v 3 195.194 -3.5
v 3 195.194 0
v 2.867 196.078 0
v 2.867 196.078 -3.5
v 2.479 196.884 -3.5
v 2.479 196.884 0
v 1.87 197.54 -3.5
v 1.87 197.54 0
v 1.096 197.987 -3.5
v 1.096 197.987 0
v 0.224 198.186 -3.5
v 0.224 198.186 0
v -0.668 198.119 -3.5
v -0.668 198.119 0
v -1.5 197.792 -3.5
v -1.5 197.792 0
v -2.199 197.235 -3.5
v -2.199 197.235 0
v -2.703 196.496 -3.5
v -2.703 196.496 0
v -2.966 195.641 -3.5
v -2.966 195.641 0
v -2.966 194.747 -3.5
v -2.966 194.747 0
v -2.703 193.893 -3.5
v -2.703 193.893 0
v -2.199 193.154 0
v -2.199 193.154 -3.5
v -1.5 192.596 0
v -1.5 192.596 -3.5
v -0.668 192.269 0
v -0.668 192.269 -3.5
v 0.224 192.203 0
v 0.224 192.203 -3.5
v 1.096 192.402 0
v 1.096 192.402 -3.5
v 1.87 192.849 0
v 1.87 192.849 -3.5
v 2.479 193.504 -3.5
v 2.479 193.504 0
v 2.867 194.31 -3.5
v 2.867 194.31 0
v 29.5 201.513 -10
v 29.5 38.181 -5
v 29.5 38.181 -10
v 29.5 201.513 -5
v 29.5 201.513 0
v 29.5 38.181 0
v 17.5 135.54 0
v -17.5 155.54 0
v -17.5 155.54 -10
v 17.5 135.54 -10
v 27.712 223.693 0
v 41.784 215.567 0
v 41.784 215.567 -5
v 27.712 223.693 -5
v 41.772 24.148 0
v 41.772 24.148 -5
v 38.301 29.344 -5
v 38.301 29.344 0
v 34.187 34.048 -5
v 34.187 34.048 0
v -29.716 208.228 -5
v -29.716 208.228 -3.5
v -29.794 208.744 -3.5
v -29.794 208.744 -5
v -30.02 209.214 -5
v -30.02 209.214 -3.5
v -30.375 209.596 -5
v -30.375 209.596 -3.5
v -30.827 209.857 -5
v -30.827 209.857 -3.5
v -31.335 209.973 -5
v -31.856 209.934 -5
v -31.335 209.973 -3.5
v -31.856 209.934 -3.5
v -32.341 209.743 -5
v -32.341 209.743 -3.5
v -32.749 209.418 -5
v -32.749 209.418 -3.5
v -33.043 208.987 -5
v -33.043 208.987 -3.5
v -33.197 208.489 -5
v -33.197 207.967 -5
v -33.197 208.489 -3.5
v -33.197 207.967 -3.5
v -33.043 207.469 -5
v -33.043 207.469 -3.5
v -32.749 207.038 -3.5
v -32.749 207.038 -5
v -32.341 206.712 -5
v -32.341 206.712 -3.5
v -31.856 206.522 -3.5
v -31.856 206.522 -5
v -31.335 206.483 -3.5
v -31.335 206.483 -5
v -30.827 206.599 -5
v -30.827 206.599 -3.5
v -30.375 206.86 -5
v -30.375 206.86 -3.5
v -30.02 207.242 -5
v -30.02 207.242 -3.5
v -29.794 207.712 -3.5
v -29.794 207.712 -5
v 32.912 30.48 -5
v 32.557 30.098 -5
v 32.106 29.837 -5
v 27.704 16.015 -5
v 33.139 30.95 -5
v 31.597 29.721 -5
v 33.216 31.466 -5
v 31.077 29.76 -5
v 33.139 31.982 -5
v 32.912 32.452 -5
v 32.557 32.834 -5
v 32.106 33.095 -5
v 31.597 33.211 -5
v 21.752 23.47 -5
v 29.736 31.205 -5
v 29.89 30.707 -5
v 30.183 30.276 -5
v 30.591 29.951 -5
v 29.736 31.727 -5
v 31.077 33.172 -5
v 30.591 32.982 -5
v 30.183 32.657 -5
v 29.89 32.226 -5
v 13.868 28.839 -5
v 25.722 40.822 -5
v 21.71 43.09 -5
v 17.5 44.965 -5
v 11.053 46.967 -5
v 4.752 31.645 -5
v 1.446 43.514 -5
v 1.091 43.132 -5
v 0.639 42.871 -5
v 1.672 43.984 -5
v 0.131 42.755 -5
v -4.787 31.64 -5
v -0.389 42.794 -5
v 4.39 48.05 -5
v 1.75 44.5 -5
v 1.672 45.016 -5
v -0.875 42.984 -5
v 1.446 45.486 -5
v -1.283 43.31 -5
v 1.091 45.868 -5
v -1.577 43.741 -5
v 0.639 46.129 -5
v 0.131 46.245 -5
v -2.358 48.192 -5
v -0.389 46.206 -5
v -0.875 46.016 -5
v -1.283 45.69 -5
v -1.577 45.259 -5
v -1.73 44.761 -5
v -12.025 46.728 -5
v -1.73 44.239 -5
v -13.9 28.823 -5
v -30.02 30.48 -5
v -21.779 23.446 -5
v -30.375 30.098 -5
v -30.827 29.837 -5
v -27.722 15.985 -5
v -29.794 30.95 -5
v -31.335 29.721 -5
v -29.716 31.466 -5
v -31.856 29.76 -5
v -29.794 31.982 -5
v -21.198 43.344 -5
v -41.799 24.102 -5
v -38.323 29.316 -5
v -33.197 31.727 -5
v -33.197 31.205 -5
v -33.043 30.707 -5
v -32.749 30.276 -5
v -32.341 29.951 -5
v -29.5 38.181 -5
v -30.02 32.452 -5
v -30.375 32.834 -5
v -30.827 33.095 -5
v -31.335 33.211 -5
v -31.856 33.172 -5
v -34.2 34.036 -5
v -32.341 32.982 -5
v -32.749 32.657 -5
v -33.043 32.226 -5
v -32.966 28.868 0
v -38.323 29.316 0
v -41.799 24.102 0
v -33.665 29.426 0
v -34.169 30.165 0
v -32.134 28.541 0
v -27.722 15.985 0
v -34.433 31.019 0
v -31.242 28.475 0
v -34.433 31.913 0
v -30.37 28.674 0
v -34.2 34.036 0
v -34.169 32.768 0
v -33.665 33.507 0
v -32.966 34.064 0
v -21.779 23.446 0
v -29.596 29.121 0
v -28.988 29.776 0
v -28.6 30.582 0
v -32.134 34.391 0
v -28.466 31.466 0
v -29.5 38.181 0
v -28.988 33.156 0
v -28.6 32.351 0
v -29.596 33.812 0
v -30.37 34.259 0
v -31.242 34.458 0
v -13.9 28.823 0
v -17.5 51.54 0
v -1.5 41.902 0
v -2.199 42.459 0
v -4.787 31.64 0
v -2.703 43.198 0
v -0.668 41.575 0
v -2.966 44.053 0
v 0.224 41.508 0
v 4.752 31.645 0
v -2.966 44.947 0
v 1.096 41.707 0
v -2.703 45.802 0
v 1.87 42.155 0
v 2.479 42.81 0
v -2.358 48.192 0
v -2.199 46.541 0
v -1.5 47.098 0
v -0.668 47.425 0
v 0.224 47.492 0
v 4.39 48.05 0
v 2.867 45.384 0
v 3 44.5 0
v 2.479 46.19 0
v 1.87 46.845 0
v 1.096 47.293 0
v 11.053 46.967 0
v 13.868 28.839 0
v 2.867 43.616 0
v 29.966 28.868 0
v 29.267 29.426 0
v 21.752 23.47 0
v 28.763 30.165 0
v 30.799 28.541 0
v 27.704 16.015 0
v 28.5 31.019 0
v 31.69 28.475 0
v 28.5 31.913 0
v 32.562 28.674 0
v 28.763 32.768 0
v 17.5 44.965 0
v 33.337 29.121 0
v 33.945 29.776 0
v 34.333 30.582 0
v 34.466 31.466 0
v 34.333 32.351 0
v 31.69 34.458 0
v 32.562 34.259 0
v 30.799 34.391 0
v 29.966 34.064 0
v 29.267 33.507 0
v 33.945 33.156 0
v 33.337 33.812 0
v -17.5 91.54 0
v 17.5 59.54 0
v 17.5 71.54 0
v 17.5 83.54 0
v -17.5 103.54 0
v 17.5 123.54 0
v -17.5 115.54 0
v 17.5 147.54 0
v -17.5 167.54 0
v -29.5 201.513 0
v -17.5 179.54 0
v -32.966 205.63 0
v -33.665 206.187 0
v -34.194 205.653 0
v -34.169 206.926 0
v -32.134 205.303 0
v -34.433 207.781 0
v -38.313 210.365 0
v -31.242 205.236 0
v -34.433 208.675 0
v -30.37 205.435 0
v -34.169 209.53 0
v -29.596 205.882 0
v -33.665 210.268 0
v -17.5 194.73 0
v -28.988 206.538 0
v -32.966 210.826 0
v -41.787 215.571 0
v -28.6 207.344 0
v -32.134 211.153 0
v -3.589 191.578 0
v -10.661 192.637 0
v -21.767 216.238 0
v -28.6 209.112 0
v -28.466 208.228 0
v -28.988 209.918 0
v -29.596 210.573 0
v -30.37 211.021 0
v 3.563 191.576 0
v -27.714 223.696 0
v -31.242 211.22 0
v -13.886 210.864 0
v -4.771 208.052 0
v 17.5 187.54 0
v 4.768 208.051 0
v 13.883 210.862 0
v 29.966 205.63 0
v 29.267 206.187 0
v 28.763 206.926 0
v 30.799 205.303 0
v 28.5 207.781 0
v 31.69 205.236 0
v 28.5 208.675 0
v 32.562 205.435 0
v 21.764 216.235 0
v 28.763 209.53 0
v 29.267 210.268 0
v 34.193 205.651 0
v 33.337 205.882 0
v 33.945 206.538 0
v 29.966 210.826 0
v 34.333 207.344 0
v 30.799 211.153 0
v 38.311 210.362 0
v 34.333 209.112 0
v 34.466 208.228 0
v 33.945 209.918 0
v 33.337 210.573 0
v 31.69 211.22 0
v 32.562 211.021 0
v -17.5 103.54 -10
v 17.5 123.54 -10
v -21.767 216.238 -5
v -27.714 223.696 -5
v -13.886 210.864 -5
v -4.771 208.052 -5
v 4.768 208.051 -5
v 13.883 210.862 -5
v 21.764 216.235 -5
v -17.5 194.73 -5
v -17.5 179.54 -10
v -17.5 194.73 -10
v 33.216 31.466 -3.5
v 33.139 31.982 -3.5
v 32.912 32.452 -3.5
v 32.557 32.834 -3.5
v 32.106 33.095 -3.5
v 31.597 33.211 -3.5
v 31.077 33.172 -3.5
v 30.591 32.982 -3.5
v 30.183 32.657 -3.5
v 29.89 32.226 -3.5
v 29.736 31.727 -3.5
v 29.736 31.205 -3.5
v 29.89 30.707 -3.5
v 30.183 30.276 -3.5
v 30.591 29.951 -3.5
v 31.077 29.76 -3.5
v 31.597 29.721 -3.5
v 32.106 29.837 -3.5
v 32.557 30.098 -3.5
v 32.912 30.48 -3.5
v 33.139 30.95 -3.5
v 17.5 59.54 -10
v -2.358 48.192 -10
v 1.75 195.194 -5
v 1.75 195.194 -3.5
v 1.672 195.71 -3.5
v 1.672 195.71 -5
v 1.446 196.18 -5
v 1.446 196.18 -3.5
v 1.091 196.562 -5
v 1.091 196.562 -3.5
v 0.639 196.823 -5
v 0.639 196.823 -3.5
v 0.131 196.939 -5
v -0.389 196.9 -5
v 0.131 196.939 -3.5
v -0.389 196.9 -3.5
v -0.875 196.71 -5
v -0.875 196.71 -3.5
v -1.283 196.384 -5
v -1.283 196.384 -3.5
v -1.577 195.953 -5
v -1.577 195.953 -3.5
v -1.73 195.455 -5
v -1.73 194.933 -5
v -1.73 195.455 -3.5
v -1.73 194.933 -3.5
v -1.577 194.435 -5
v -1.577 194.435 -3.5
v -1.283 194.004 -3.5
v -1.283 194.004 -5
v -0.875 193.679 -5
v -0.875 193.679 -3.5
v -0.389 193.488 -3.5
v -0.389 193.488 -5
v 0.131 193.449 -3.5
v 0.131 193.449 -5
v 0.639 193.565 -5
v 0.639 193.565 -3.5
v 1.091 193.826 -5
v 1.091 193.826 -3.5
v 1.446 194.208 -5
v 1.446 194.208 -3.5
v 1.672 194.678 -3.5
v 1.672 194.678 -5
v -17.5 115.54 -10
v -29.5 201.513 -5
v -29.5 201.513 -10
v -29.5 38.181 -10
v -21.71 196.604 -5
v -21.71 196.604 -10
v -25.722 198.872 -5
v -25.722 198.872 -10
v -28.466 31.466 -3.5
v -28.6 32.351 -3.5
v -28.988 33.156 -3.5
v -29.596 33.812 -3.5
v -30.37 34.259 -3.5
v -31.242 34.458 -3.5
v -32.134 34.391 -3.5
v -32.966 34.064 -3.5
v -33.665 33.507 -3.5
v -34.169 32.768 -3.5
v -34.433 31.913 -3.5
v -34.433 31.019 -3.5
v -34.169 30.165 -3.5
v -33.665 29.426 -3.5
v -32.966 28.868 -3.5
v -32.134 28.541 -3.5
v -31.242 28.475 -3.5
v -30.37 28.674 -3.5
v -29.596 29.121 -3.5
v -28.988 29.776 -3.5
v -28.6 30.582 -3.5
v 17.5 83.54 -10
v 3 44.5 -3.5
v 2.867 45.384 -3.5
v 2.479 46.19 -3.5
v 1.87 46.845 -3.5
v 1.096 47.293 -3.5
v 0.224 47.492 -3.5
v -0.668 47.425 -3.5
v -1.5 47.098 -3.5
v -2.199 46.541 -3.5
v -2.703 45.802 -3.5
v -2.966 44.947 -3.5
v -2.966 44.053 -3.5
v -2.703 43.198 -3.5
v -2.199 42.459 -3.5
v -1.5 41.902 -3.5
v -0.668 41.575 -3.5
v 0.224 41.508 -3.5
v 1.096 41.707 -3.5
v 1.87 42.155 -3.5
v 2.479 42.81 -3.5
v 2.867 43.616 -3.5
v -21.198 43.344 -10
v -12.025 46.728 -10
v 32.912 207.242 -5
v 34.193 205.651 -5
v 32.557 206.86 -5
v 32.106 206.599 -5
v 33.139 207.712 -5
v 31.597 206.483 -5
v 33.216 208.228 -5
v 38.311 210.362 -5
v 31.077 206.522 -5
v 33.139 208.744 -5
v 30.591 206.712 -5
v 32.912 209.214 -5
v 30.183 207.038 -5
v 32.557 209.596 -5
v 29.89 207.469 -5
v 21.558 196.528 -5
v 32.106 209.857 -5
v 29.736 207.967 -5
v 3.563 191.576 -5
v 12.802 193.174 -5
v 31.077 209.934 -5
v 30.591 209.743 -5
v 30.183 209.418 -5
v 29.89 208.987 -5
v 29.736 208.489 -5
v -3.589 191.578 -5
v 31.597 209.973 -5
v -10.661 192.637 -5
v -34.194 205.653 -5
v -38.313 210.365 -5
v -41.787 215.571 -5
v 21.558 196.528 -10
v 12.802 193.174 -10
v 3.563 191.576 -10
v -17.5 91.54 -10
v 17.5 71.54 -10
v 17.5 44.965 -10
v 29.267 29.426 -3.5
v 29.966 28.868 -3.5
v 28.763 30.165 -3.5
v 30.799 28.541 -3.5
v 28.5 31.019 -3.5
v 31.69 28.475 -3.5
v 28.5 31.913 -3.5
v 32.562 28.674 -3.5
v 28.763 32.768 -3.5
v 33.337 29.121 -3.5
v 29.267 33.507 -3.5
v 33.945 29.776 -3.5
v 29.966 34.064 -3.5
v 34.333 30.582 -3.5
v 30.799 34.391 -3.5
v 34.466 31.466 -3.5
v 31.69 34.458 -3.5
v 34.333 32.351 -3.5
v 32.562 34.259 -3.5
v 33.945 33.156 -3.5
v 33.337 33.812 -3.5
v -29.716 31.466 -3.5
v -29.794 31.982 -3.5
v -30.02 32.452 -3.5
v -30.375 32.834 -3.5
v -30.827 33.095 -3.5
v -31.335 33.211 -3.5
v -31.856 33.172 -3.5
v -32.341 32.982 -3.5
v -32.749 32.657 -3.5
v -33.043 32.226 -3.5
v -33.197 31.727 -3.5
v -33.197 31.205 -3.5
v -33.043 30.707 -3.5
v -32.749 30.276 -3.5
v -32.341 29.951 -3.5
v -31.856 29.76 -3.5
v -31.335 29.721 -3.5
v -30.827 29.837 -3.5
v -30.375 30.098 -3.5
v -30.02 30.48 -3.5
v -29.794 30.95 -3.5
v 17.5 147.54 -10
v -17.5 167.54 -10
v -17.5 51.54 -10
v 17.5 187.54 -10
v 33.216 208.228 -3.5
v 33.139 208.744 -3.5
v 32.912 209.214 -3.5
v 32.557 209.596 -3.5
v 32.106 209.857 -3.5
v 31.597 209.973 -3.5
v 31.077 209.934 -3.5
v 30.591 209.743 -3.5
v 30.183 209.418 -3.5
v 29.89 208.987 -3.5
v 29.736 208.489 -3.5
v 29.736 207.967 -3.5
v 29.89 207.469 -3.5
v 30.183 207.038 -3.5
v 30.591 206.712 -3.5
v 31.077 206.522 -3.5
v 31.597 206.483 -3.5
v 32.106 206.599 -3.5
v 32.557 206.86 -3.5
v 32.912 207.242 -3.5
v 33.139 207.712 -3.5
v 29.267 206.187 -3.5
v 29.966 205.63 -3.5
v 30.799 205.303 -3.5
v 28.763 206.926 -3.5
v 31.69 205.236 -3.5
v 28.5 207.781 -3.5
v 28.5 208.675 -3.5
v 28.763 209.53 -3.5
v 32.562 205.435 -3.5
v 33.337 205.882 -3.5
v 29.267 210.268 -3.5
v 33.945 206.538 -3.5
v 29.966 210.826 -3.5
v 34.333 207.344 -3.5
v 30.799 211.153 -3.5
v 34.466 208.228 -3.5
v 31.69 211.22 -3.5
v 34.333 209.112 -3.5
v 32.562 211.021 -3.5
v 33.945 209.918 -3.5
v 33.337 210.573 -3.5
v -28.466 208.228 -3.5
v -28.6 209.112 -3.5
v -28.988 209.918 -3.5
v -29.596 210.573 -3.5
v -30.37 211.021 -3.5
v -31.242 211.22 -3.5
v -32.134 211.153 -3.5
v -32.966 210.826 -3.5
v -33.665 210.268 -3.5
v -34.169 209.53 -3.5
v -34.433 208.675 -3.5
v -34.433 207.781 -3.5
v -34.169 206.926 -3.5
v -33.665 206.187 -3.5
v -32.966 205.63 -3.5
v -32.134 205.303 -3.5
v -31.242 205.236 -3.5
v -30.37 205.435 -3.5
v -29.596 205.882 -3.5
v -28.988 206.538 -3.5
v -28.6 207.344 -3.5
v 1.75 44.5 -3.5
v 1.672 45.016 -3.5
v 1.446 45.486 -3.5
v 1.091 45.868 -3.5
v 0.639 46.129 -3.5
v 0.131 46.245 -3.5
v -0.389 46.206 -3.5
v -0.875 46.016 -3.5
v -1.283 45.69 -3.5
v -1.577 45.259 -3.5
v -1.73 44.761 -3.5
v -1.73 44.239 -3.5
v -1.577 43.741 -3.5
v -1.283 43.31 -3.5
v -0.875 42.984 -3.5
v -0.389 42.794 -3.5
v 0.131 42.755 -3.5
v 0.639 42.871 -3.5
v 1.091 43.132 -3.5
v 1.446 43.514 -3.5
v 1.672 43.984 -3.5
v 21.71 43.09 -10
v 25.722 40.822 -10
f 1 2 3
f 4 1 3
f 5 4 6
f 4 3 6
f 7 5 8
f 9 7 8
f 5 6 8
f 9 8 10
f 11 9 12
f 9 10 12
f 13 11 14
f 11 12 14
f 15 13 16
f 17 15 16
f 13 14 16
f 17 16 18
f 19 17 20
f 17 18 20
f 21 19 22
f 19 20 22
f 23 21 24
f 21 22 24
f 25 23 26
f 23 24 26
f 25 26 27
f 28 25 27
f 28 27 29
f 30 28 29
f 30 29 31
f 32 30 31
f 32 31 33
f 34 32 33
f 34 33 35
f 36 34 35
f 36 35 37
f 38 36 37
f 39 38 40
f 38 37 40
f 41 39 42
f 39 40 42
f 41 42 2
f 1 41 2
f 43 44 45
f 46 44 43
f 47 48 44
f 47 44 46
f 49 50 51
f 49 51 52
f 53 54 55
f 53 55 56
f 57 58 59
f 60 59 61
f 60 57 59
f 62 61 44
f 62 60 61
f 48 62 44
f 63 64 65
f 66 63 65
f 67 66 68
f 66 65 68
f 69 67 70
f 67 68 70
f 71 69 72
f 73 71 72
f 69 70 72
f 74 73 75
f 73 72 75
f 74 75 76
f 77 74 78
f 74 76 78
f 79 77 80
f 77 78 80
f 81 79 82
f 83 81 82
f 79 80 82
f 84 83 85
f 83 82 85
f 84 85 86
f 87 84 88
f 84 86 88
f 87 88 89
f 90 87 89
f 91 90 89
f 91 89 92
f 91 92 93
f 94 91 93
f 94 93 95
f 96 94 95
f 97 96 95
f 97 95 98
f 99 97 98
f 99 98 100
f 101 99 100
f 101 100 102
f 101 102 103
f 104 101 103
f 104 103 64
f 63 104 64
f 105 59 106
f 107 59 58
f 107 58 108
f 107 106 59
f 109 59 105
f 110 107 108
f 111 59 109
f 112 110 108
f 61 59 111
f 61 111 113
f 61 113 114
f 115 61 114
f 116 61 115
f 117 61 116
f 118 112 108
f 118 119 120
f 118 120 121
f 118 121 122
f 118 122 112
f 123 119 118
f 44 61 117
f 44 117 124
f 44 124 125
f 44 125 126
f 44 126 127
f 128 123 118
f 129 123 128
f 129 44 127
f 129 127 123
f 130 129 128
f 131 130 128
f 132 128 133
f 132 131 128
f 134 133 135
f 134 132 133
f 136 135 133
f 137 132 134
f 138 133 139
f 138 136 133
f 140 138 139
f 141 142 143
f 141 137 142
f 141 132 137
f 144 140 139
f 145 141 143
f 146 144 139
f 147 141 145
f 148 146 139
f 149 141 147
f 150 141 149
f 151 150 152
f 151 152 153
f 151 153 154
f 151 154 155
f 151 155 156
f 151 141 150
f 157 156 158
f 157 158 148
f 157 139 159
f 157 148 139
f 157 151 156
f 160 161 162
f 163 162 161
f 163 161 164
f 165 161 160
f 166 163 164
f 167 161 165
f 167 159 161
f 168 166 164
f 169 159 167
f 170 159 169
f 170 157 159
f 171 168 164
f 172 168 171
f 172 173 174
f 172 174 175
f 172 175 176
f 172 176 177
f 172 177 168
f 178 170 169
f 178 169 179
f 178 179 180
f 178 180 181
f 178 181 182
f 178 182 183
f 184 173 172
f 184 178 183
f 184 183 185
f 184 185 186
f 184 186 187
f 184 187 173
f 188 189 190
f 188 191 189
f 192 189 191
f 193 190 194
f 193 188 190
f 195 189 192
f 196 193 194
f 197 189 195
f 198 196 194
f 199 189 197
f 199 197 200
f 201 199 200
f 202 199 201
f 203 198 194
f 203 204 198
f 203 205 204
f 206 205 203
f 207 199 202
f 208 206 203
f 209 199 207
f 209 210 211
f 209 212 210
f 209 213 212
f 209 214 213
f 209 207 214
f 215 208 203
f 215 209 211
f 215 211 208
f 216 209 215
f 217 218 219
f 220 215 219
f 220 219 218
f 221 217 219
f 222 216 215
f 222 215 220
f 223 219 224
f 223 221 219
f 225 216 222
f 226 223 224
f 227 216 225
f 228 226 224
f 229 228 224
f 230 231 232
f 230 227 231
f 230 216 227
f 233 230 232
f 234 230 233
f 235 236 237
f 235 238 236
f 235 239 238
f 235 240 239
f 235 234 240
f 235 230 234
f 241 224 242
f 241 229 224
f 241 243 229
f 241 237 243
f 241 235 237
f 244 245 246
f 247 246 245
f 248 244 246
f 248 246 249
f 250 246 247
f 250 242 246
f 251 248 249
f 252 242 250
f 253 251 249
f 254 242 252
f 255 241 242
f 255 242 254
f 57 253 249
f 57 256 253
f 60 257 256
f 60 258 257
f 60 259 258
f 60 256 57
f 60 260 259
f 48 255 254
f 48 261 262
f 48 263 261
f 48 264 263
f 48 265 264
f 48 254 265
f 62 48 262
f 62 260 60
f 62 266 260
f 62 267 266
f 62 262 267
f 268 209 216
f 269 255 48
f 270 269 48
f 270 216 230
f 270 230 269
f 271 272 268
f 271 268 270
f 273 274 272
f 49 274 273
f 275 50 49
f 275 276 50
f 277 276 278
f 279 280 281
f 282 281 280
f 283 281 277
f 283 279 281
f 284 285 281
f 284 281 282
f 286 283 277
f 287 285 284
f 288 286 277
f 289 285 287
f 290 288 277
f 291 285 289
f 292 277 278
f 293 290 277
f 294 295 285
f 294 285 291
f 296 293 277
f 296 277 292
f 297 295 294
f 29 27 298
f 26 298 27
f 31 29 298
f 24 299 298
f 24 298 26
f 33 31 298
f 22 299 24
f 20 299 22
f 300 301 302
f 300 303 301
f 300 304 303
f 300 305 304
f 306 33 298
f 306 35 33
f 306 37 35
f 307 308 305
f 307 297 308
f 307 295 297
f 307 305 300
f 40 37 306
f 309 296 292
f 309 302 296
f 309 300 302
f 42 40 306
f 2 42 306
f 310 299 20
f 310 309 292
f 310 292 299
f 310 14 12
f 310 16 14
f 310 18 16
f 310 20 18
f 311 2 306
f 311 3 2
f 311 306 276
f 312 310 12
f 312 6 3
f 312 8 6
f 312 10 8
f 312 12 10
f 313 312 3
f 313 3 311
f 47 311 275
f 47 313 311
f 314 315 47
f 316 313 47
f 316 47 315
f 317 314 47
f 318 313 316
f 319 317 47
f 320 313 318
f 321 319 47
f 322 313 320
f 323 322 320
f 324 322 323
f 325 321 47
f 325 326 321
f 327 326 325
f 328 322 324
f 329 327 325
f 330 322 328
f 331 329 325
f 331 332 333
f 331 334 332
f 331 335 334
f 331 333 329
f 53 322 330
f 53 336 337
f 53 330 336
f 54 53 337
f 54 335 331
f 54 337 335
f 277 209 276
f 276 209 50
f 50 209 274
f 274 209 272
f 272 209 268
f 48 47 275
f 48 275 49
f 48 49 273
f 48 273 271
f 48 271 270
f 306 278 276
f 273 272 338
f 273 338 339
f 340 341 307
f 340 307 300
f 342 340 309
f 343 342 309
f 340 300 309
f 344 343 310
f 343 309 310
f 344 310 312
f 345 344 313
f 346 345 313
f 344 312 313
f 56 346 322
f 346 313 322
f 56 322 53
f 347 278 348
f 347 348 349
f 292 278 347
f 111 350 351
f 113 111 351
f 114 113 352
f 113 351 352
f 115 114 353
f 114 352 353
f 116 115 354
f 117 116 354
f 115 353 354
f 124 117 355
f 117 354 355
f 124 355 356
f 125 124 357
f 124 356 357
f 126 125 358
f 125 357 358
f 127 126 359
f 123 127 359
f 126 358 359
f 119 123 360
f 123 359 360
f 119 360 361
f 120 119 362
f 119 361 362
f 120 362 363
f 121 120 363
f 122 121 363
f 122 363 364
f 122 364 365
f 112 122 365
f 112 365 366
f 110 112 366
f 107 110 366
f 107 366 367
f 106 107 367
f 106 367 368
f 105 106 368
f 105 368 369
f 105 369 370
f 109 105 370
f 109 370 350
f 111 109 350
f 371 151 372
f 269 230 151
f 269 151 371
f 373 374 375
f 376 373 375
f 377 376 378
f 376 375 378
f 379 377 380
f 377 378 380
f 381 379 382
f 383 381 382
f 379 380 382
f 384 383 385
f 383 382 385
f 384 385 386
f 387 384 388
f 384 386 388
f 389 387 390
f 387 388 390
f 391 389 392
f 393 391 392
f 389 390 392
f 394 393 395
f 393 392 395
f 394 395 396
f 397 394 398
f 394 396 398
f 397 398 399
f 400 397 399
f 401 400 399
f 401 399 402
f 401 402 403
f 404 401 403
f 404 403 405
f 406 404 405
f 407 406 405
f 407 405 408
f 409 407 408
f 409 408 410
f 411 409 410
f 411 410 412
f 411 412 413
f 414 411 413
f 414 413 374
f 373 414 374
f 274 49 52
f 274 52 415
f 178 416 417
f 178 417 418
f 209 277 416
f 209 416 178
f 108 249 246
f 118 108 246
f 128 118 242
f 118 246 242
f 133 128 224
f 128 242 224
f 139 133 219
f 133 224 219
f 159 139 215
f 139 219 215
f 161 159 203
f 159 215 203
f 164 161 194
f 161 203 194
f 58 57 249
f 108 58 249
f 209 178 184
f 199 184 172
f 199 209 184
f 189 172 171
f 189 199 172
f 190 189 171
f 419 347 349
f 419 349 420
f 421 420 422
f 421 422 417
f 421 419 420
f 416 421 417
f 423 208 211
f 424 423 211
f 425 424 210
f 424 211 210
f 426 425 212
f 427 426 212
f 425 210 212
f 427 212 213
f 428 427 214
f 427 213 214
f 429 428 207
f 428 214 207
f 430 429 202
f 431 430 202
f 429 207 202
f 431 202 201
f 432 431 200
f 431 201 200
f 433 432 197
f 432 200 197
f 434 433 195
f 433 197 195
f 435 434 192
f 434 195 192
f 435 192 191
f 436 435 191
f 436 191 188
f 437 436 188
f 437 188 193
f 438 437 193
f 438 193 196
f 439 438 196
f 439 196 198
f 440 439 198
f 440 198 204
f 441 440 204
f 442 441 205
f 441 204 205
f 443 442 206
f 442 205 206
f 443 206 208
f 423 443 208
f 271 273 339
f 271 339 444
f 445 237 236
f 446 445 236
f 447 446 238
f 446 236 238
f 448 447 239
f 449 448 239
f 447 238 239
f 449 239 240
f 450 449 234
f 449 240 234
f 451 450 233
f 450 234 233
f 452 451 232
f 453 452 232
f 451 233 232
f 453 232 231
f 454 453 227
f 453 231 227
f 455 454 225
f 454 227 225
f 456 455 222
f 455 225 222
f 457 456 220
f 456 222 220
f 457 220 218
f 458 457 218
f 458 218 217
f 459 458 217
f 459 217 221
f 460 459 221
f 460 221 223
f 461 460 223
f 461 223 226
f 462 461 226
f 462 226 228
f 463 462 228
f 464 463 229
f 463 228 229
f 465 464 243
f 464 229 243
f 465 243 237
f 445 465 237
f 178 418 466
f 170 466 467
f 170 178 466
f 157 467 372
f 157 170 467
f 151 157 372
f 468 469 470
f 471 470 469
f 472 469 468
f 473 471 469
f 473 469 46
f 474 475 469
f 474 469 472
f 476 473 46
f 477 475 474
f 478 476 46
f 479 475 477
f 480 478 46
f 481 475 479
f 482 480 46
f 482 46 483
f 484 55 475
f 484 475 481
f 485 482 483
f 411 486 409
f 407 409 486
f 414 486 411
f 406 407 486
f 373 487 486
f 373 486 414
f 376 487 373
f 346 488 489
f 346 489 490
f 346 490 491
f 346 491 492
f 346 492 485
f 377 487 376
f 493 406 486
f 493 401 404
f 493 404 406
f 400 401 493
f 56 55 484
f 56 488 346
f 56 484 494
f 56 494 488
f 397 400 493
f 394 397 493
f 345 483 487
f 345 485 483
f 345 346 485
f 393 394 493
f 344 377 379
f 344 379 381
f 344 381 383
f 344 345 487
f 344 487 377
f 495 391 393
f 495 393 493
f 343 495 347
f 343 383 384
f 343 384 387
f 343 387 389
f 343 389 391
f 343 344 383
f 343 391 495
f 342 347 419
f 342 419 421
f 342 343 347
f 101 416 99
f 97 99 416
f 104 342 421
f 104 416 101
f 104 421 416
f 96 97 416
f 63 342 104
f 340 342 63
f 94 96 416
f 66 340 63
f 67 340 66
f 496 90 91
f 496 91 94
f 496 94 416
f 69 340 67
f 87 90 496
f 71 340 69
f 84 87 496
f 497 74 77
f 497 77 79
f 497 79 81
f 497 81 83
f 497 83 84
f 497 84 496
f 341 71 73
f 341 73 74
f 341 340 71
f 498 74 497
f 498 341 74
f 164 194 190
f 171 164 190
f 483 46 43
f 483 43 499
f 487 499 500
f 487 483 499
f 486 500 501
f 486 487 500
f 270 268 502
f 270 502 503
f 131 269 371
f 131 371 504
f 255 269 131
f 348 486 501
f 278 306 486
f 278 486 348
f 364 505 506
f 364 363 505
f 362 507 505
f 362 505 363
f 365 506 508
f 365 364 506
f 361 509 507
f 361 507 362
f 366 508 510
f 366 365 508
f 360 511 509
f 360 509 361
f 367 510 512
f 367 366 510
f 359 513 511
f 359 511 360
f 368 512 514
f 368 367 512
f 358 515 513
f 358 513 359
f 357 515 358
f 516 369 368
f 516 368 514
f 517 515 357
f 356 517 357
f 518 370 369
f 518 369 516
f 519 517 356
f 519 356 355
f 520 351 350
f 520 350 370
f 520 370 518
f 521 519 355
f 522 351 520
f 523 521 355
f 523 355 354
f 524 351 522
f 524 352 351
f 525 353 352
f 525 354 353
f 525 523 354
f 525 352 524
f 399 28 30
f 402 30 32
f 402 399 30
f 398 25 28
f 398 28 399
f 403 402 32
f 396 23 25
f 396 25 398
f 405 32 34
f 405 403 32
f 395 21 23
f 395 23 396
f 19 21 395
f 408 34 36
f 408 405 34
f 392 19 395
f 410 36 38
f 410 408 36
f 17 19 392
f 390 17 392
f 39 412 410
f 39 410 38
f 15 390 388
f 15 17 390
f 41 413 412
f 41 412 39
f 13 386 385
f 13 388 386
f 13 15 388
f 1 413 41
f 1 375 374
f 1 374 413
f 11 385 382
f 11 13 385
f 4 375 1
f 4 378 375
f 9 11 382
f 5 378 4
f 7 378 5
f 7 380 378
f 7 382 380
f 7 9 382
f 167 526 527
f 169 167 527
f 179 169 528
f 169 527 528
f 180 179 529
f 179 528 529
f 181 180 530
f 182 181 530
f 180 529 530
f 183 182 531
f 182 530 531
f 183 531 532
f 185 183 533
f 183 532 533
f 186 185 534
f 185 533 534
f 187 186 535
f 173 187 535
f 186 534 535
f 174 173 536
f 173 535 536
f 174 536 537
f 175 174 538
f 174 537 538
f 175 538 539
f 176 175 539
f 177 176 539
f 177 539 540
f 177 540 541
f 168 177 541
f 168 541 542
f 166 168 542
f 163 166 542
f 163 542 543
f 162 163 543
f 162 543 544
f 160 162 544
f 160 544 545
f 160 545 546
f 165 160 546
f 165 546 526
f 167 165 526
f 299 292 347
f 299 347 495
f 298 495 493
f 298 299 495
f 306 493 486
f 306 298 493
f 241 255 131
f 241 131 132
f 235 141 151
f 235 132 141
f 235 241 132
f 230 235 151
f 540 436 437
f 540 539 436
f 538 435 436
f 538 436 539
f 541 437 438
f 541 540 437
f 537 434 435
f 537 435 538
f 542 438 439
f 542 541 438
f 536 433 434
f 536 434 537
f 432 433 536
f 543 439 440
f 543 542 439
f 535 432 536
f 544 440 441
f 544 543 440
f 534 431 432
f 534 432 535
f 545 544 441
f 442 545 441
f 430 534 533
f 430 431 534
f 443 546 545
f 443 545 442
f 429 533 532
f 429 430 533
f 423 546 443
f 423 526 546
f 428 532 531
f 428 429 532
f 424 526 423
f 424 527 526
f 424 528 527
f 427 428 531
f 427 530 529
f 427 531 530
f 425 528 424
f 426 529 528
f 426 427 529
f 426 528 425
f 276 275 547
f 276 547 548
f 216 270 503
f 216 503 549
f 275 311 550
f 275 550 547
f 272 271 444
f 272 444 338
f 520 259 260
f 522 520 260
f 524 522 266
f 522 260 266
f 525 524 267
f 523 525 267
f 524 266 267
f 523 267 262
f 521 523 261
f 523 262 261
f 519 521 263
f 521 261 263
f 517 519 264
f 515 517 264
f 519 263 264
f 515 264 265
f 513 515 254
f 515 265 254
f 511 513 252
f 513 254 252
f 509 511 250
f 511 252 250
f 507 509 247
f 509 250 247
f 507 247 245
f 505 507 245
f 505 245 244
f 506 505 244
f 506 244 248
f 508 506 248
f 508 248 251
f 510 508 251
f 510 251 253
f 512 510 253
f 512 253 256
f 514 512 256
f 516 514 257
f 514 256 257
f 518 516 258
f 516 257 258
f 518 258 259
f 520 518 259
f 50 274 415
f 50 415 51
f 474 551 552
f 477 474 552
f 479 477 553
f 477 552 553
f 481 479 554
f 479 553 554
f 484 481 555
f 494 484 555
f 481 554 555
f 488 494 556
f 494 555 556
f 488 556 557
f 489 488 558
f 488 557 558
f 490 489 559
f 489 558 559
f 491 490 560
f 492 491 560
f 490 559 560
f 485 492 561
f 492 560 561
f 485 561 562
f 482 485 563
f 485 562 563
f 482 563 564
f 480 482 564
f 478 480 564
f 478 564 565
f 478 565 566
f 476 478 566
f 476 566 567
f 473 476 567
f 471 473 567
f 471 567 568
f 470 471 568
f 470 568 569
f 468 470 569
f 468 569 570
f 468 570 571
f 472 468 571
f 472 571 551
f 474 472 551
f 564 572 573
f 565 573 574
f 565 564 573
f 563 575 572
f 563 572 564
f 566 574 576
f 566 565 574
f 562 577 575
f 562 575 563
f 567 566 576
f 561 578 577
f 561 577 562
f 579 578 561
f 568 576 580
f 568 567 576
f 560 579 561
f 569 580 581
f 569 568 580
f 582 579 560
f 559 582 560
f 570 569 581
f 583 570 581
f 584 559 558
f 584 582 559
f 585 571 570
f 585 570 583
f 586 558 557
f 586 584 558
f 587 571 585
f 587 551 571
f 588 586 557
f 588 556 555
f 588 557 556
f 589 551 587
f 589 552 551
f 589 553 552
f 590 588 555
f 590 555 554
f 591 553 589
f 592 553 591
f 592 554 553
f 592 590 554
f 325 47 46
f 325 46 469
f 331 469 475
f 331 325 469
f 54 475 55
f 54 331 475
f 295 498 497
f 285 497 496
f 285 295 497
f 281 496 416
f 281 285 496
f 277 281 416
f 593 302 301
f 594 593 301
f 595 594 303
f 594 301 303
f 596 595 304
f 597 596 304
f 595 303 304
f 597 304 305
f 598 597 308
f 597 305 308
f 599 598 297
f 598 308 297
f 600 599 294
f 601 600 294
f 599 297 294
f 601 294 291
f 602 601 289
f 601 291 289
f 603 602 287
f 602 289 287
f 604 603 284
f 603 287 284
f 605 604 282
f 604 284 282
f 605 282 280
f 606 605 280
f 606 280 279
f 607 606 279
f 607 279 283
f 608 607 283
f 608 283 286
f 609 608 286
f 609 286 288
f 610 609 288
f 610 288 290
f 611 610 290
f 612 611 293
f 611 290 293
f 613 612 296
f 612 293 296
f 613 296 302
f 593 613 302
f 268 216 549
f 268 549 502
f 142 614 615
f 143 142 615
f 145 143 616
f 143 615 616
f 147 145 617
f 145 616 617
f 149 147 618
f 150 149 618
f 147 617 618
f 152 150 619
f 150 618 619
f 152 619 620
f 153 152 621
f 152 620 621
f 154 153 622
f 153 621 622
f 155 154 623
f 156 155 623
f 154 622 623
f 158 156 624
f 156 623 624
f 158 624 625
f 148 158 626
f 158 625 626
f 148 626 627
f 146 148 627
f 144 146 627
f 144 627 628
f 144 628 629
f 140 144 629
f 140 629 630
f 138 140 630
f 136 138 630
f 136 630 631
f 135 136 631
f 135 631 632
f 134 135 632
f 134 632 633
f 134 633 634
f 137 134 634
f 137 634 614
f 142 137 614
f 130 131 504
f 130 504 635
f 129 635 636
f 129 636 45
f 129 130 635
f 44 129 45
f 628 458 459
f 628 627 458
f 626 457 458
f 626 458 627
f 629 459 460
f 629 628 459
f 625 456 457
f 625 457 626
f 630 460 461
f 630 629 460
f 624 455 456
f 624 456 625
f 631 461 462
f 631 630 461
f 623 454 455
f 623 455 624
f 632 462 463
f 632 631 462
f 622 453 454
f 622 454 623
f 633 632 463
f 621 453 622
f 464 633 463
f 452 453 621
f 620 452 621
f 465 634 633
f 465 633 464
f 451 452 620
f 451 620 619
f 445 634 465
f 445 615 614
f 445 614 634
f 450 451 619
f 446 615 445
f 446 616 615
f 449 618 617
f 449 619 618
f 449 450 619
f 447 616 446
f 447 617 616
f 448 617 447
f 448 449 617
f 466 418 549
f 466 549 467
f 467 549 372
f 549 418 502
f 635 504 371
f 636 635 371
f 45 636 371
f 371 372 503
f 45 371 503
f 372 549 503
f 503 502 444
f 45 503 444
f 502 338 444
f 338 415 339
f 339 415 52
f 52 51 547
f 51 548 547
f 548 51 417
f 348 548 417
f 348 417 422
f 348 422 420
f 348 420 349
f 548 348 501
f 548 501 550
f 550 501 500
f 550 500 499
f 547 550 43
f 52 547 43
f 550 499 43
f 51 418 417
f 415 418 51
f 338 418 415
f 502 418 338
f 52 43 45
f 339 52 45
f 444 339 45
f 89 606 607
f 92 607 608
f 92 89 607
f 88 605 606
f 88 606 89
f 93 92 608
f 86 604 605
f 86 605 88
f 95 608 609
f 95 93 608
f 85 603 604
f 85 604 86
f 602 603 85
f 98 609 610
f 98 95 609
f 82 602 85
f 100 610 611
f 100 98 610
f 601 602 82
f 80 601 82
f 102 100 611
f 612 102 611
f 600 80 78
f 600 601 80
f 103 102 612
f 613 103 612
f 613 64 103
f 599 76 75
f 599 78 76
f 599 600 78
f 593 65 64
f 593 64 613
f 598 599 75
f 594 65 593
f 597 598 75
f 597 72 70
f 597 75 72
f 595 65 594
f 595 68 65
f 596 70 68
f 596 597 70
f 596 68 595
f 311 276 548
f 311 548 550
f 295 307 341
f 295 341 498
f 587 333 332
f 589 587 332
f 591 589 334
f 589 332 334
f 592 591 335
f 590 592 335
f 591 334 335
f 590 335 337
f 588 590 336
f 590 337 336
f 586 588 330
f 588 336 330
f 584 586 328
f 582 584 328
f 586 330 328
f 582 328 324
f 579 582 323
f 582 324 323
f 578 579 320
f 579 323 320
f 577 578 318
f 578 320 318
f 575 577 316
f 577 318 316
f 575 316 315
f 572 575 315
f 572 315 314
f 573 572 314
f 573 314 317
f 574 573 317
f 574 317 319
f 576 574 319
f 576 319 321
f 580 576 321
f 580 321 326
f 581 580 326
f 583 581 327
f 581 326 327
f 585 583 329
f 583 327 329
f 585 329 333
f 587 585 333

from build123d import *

# Parameters (mm, degrees)
SKETCH1_R           = 48.25
BOSS_EXTRUDE1_DEPTH = 10
SKETCH2_W           = 17.162038191
SKETCH2_H           = 56.822210482
SKETCH2_W_2         = 16.152506533
SKETCH2_H_2         = 65.186901365
CUT_EXTRUDE1_DEPTH  = 8
SKETCH3_R           = 32
CUT_EXTRUDE2_DEPTH  = 10
SKETCH4_R           = 1.75
CUT_EXTRUDE3_DEPTH  = 10
SKETCH9_R           = 3
CUT_EXTRUDE4_DEPTH  = 3.5
SKETCH12_R          = 48.25
BOSS_EXTRUDE4_DEPTH = 10
SKETCH13_W          = 17.162038191
SKETCH13_H          = 240.265998925
SKETCH13_W_2        = 16.152506533
SKETCH13_H_2        = 226.18217938
CUT_EXTRUDE5_DEPTH  = 5
SKETCH14_R          = 30
CUT_EXTRUDE6_DEPTH  = 10
CUT_EXTRUDE7_DEPTH  = 10
CUT_EXTRUDE8_DEPTH  = 10
SKETCH19_R          = 1.75
CUT_EXTRUDE9_DEPTH  = 10
BOSS_EXTRUDE5_DEPTH = 10
SKETCH21_R          = 32
CUT_EXTRUDE11_DEPTH = 10
SKETCH23_R          = 3
CUT_EXTRUDE13_DEPTH = 3.5
CUT_EXTRUDE14_START = -5
SKETCH24_R          = 48.25
CUT_EXTRUDE14_DEPTH = 5


with BuildPart() as part:
    # Sketch1 → Boss-Extrude1 (new body)
    with BuildSketch(Plane.XY):
        Circle(SKETCH1_R)
    extrude(amount=-BOSS_EXTRUDE1_DEPTH)

    # Sketch2 → Cut-Extrude1 (cut)
    with BuildSketch(Plane.XY):
        with Locations((-54.831019095, 0)):
            Rectangle(SKETCH2_W, SKETCH2_H)
        with Locations((54.326253267, -4.182345442)):
            Rectangle(SKETCH2_W_2, SKETCH2_H_2)
    extrude(amount=-CUT_EXTRUDE1_DEPTH, mode=Mode.SUBTRACT)

    # Sketch3 → Cut-Extrude2 (cut)
    with BuildSketch(Plane.XY):
        Circle(SKETCH3_R)
    extrude(amount=-CUT_EXTRUDE2_DEPTH, mode=Mode.SUBTRACT)

    # Sketch4 → Cut-Extrude3 (cut)
    with BuildSketch(Plane.XY):
        with Locations((-42.5, 0)):
            Circle(SKETCH4_R)
        with Locations((0, -44.5)):
            Circle(SKETCH4_R)
        with Locations((0, 44.5)):
            Circle(SKETCH4_R)
        with Locations((42.5, 0)):
            Circle(SKETCH4_R)
        with Locations((-31.466251763, -31.466251763)):
            Circle(SKETCH4_R)
        with Locations((31.466251763, -31.466251763)):
            Circle(SKETCH4_R)
        with Locations((31.466251763, 31.466251763)):
            Circle(SKETCH4_R)
        with Locations((-31.466251763, 31.466251763)):
            Circle(SKETCH4_R)
    extrude(amount=-CUT_EXTRUDE3_DEPTH, mode=Mode.SUBTRACT)

    # Sketch9 → Cut-Extrude4 (cut)
    with BuildSketch(Plane.XY):
        with Locations((-42.5, 0)):
            Circle(SKETCH9_R)
        with Locations((42.5, 0)):
            Circle(SKETCH9_R)
        with Locations((31.466251763, 31.466251763)):
            Circle(SKETCH9_R)
        with Locations((-31.466251763, 31.466251763)):
            Circle(SKETCH9_R)
        with Locations((-31.466251763, -31.466251763)):
            Circle(SKETCH9_R)
        with Locations((31.466251763, -31.466251763)):
            Circle(SKETCH9_R)
        with Locations((0, -44.5)):
            Circle(SKETCH9_R)
        with Locations((0, 44.5)):
            Circle(SKETCH9_R)
    extrude(amount=-CUT_EXTRUDE4_DEPTH, mode=Mode.SUBTRACT)

    # Sketch17 → Cut-Extrude7 (cut)
    with BuildSketch(Plane.XY):
        Polygon((0, 0), (-69.304284442, 39.961433382), (-69.278270797, -65.322297693), (63.970930278, -62.407226987), (69.259758702, 40.038554227), align=None)
    extrude(amount=-CUT_EXTRUDE7_DEPTH, mode=Mode.SUBTRACT)



with BuildPart() as body_2:
    # Sketch12 → Boss-Extrude4 (new body)
    with BuildSketch(Plane.XY):
        with Locations((0, 239.694162197)):
            Circle(SKETCH12_R)
    extrude(amount=-BOSS_EXTRUDE4_DEPTH)

    # Sketch13 → Cut-Extrude5 (cut)
    with BuildSketch(Plane.XY):
        with Locations((-54.831019095, 316.834631882)):
            Rectangle(SKETCH13_W, SKETCH13_H)
        with Locations((54.326253267, 300.281083797)):
            Rectangle(SKETCH13_W_2, SKETCH13_H_2)
    extrude(amount=-CUT_EXTRUDE5_DEPTH, mode=Mode.SUBTRACT)

    # Sketch14 → Cut-Extrude6 (cut)
    with BuildSketch(Plane.XY):
        with Locations((0, 239.694162197)):
            Circle(SKETCH14_R)
    extrude(amount=-CUT_EXTRUDE6_DEPTH, mode=Mode.SUBTRACT)

    # Sketch18 → Cut-Extrude8 (cut)
    with BuildSketch(Plane.XY):
        Polygon((0, 239.694162197), (-69.284269814, 199.69803793), (-69.066382196, 357.511219566), (54.70167511, 362.333351669), (69.279794575, 199.690286588), align=None)
    extrude(amount=-CUT_EXTRUDE8_DEPTH, mode=Mode.SUBTRACT)

    # Sketch19 → Cut-Extrude9 (cut)
    with BuildSketch(Plane.XY):
        with Locations((0, 195.194162197)):
            Circle(SKETCH19_R)
        with Locations((-31.466251763, 208.227910434)):
            Circle(SKETCH19_R)
        with Locations((31.466251763, 208.227910434)):
            Circle(SKETCH19_R)
    extrude(amount=-CUT_EXTRUDE9_DEPTH, mode=Mode.SUBTRACT)


with BuildPart() as part_1:
    add(part.part)

    add(body_2.part)  # Boss-Extrude5 merges body 2
    # Sketch10 → Boss-Extrude5 (add)
    with BuildSketch(Plane.XY):
        with BuildLine():
            Line((-17.5, 179.53997423), (-17.5, 194.729592811))
            ThreePointArc((-17.5, 194.729592811), (-23.743486454, 197.690479608), (-29.5, 201.512851323))
            Line((-29.5, 201.512851323), (-29.5, 38.181310873))
            ThreePointArc((-29.5, 38.181310873), (-16.697131744, 45.268844601), (-2.358379682, 48.192328697))
            Line((-2.358379682, 48.192328697), (17.5, 59.53997423))
            Line((17.5, 59.53997423), (17.5, 44.964569385))
            ThreePointArc((17.5, 44.964569385), (23.743486454, 42.003682588), (29.5, 38.181310873))
            Line((29.5, 38.181310873), (29.5, 201.512851323))
            ThreePointArc((29.5, 201.512851323), (17.261915402, 194.637655711), (3.562842942, 191.575884483))
            Line((3.562842942, 191.575884483), (-17.5, 179.53997423))
        make_face()
        Polygon((17.5, 187.53997423), (17.5, 147.53997423), (-17.5, 167.53997423), align=None, mode=Mode.SUBTRACT)
        Polygon((17.5, 135.53997423), (-17.5, 115.53997423), (-17.5, 155.53997423), align=None, mode=Mode.SUBTRACT)
        Polygon((17.5, 123.53997423), (17.5, 83.53997423), (-17.5, 103.53997423), align=None, mode=Mode.SUBTRACT)
        Polygon((17.5, 71.53997423), (-17.5, 51.53997423), (-17.5, 91.53997423), align=None, mode=Mode.SUBTRACT)
    extrude(amount=-BOSS_EXTRUDE5_DEPTH)

    # Sketch21 → Cut-Extrude11 (cut)
    with BuildSketch(Plane.XY):
        with Locations((0, 239.694162197)):
            Circle(SKETCH21_R)
    extrude(amount=-CUT_EXTRUDE11_DEPTH, mode=Mode.SUBTRACT)

    # Sketch23 → Cut-Extrude13 (cut)
    with BuildSketch(Plane.XY):
        with Locations((-31.466251763, 208.227910434)):
            Circle(SKETCH23_R)
        with Locations((0, 195.194162197)):
            Circle(SKETCH23_R)
        with Locations((31.466251763, 208.227910434)):
            Circle(SKETCH23_R)
        with Locations((0, 44.5)):
            Circle(SKETCH23_R)
    extrude(amount=-CUT_EXTRUDE13_DEPTH, mode=Mode.SUBTRACT)

    # Sketch24 → Cut-Extrude14 (cut)
    with BuildSketch(Plane(origin=(0, 0, -10), x_dir=(-1, 0, 0), z_dir=(0, 0, -1)).offset(CUT_EXTRUDE14_START)):
        with Locations((0, 239.694162197)):
            Circle(SKETCH24_R)
        Circle(SKETCH24_R)
    extrude(amount=CUT_EXTRUDE14_DEPTH, mode=Mode.SUBTRACT)


solid = part_1.part
